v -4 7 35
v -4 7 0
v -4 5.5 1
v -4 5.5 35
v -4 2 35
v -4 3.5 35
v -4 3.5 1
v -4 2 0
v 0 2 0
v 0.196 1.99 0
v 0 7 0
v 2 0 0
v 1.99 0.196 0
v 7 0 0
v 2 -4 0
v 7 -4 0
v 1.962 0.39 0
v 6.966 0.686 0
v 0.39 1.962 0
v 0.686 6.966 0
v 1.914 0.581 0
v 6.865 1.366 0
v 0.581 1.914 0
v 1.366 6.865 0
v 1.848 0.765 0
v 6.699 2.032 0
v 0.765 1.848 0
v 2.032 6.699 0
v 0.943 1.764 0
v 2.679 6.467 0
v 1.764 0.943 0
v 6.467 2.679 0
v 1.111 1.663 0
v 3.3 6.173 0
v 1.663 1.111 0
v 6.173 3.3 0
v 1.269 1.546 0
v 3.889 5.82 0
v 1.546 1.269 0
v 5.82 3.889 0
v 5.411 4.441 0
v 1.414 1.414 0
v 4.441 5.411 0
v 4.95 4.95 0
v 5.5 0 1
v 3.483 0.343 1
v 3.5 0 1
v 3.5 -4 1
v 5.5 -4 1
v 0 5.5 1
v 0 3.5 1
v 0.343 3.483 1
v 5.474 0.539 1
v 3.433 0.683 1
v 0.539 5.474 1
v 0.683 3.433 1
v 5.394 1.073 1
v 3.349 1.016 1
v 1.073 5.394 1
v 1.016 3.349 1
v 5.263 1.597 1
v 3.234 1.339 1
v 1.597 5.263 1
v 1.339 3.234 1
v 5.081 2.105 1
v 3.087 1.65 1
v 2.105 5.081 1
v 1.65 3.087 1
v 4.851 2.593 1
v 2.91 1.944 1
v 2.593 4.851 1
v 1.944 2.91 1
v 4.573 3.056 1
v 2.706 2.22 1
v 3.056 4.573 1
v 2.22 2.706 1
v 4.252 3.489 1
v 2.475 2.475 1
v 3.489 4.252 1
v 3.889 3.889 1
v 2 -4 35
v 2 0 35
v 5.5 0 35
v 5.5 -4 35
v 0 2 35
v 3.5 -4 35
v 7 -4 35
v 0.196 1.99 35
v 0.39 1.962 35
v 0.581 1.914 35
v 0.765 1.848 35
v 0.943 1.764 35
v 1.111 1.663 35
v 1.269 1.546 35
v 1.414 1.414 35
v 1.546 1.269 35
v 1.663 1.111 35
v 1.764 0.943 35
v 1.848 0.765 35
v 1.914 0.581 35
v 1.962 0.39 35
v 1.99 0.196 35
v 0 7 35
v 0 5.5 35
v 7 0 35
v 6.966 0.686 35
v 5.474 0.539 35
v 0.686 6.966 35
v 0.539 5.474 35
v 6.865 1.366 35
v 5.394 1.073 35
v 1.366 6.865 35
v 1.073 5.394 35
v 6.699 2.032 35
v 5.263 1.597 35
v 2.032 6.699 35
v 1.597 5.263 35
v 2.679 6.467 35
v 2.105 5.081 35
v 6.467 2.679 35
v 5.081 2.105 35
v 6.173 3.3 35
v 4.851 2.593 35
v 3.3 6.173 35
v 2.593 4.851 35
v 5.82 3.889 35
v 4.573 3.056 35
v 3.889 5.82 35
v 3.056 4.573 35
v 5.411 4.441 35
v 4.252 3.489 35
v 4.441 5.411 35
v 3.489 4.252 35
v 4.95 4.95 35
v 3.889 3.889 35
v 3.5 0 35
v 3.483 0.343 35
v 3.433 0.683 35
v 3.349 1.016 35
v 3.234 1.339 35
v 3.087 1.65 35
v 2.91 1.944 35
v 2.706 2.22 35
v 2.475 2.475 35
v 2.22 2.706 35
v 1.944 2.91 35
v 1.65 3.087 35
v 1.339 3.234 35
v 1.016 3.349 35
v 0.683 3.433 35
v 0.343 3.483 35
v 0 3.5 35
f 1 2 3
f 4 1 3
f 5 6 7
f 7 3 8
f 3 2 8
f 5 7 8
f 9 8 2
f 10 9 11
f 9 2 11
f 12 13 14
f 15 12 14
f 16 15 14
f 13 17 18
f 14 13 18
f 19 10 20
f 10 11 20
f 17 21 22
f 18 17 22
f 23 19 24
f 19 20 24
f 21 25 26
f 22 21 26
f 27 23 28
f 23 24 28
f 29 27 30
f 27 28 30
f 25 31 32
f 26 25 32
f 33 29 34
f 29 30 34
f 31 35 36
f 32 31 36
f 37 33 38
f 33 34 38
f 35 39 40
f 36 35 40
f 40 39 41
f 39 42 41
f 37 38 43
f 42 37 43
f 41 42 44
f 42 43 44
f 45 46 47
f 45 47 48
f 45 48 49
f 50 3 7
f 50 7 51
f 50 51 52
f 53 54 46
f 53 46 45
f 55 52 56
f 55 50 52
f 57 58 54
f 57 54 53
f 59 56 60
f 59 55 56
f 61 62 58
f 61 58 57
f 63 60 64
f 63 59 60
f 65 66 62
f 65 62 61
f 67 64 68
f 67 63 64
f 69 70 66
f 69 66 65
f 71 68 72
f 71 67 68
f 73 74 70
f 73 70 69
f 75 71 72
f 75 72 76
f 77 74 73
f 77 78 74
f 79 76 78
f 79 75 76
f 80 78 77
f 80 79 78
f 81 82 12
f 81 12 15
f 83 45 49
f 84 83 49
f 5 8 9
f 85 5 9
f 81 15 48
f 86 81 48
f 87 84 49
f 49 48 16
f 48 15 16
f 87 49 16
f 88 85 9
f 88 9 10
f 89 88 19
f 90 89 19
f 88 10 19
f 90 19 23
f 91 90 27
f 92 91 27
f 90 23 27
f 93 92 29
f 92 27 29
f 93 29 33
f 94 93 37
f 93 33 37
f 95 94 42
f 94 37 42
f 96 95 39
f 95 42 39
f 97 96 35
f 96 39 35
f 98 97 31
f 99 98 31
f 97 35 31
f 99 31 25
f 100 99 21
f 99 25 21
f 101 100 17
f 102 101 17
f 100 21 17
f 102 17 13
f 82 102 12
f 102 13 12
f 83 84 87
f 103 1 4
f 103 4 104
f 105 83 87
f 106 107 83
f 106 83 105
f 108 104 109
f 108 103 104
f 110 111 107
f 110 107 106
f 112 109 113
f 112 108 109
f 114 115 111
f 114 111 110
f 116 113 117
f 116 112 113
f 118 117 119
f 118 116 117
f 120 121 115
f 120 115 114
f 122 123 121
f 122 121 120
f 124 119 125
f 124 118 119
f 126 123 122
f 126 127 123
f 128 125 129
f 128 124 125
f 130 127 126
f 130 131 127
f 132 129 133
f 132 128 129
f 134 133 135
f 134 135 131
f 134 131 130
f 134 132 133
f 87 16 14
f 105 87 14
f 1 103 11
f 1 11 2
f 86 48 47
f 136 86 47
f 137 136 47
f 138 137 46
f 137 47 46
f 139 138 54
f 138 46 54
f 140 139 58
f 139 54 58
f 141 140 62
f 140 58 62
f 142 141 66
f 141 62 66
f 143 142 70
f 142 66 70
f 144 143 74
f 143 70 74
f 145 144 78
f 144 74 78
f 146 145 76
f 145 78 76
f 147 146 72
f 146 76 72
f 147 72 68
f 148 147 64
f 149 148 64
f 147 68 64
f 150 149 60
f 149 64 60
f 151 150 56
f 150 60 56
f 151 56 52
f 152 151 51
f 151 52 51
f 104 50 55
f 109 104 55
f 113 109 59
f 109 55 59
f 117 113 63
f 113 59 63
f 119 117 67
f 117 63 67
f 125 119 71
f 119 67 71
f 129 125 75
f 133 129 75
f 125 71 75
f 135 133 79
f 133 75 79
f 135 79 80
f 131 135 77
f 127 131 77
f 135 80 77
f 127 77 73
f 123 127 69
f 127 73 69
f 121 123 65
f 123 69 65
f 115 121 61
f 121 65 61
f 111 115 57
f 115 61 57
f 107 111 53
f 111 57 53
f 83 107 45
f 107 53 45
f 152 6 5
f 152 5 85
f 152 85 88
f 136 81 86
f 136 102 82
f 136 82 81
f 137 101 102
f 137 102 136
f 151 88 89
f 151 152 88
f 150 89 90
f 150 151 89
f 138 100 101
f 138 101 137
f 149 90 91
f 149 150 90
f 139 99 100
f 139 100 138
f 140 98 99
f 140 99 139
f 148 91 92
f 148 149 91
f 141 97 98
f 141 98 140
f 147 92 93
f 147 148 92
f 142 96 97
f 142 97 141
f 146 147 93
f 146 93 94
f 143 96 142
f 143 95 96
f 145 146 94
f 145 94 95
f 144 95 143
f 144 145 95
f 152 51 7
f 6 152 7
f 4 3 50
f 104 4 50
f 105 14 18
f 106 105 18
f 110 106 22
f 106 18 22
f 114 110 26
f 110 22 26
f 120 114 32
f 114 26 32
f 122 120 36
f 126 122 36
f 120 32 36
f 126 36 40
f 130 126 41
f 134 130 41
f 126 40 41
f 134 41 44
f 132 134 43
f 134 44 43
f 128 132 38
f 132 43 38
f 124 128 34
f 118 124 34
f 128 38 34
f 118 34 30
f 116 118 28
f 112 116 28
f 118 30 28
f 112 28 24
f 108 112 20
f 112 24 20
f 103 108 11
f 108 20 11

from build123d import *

# Parameters (mm, degrees)
F2_DEPTH = 1
F3_DEPTH = 35


# Not quite as in the source:
# - a feature names something its author has since deleted; it is built from what else it names


with BuildPart() as f2:
    # F1 (on Top) → F2 (new body)
    with BuildSketch(Plane.XY):
        with BuildLine():
            Line((-4, 5.5), (-4, 3.7749172176))
            ThreePointArc((-4, 3.7749172176), (-2.1780674121, 5.0503487353), (0, 5.5))
            Line((0, 5.5), (-4, 5.5))
        make_face()
        with BuildLine():
            ThreePointArc((5.5, 0), (5.0503487353, -2.1780674121), (3.7749172176, -4))
            Line((3.7749172176, -4), (5.5, -4))
            Line((5.5, -4), (5.5, 0))
        make_face()
        with BuildLine():
            Line((-4, 7), (-4, 5.7445626465))
            ThreePointArc((-4, 5.7445626465), (-2.0961943462, 6.6787700412), (0, 7))
            Line((0, 7), (-4, 7))
        make_face()
        with BuildLine():
            ThreePointArc((7, 0), (6.6787700412, -2.0961943462), (5.7445626465, -4))
            Line((5.7445626465, -4), (7, -4))
            Line((7, -4), (7, 0))
        make_face()
        with BuildLine():
            Line((-4, 2), (-2.8722813233, 2))
            ThreePointArc((-2.8722813233, 2), (-1.6201851746, 3.1024184115), (0, 3.5))
            Line((0, 3.5), (-4, 3.5))
            Line((-4, 3.5), (-4, 2))
        make_face()
        with BuildLine():
            ThreePointArc((3.5, 0), (3.1024184115, -1.6201851746), (2, -2.8722813233))
            Line((2, -2.8722813233), (2, -4))
            Line((2, -4), (3.5, -4))
            Line((3.5, -4), (3.5, 0))
        make_face()
        with BuildLine():
            ThreePointArc((0, 2), (1.4142135624, 1.4142135624), (2, 0))
            Line((2, 0), (2, -2.8722813233))
            ThreePointArc((2, -2.8722813233), (3.1024184115, -1.6201851746), (3.5, 0))
            ThreePointArc((3.5, 0), (2.4748737342, 2.4748737342), (0, 3.5))
            ThreePointArc((0, 3.5), (-1.6201851746, 3.1024184115), (-2.8722813233, 2))
            Line((-2.8722813233, 2), (0, 2))
        make_face()
        with BuildLine():
            ThreePointArc((0, 3.5), (2.4748737342, 2.4748737342), (3.5, 0))
            Line((3.5, 0), (3.5, -4))
            Line((3.5, -4), (3.7749172176, -4))
            ThreePointArc((3.7749172176, -4), (5.0503487353, -2.1780674121), (5.5, 0))
            ThreePointArc((5.5, 0), (3.8890872965, 3.8890872965), (0, 5.5))
            ThreePointArc((0, 5.5), (-2.1780674121, 5.0503487353), (-4, 3.7749172176))
            Line((-4, 3.7749172176), (-4, 3.5))
            Line((-4, 3.5), (0, 3.5))
        make_face()
        with BuildLine():
            ThreePointArc((0, 5.5), (3.8890872965, 3.8890872965), (5.5, 0))
            Line((5.5, 0), (5.5, -4))
            Line((5.5, -4), (5.7445626465, -4))
            ThreePointArc((5.7445626465, -4), (6.6787700412, -2.0961943462), (7, 0))
            ThreePointArc((7, 0), (4.9497474683, 4.9497474683), (0, 7))
            ThreePointArc((0, 7), (-2.0961943462, 6.6787700412), (-4, 5.7445626465))
            Line((-4, 5.7445626465), (-4, 5.5))
            Line((-4, 5.5), (0, 5.5))
        make_face()
    extrude(amount=F2_DEPTH)

    # F1 (on Top) → F3 (join)
    with BuildSketch(Plane.XY):
        with BuildLine():
            ThreePointArc((0, 5.5), (3.8890872965, 3.8890872965), (5.5, 0))
            Line((5.5, 0), (5.5, -4))
            Line((5.5, -4), (5.7445626465, -4))
            ThreePointArc((5.7445626465, -4), (6.6787700412, -2.0961943462), (7, 0))
            ThreePointArc((7, 0), (4.9497474683, 4.9497474683), (0, 7))
            ThreePointArc((0, 7), (-2.0961943462, 6.6787700412), (-4, 5.7445626465))
            Line((-4, 5.7445626465), (-4, 5.5))
            Line((-4, 5.5), (0, 5.5))
        make_face()
        with BuildLine():
            Line((-4, 7), (-4, 5.7445626465))
            ThreePointArc((-4, 5.7445626465), (-2.0961943462, 6.6787700412), (0, 7))
            Line((0, 7), (-4, 7))
        make_face()
        with BuildLine():
            ThreePointArc((7, 0), (6.6787700412, -2.0961943462), (5.7445626465, -4))
            Line((5.7445626465, -4), (7, -4))
            Line((7, -4), (7, 0))
        make_face()
        with BuildLine():
            ThreePointArc((3.5, 0), (3.1024184115, -1.6201851746), (2, -2.8722813233))
            Line((2, -2.8722813233), (2, -4))
            Line((2, -4), (3.5, -4))
            Line((3.5, -4), (3.5, 0))
        make_face()
        with BuildLine():
            ThreePointArc((0, 2), (1.4142135624, 1.4142135624), (2, 0))
            Line((2, 0), (2, -2.8722813233))
            ThreePointArc((2, -2.8722813233), (3.1024184115, -1.6201851746), (3.5, 0))
            ThreePointArc((3.5, 0), (2.4748737342, 2.4748737342), (0, 3.5))
            ThreePointArc((0, 3.5), (-1.6201851746, 3.1024184115), (-2.8722813233, 2))
            Line((-2.8722813233, 2), (0, 2))
        make_face()
        with BuildLine():
            Line((-4, 2), (-2.8722813233, 2))
            ThreePointArc((-2.8722813233, 2), (-1.6201851746, 3.1024184115), (0, 3.5))
            Line((0, 3.5), (-4, 3.5))
            Line((-4, 3.5), (-4, 2))
        make_face()
    extrude(amount=F3_DEPTH)


solid = f2.part
